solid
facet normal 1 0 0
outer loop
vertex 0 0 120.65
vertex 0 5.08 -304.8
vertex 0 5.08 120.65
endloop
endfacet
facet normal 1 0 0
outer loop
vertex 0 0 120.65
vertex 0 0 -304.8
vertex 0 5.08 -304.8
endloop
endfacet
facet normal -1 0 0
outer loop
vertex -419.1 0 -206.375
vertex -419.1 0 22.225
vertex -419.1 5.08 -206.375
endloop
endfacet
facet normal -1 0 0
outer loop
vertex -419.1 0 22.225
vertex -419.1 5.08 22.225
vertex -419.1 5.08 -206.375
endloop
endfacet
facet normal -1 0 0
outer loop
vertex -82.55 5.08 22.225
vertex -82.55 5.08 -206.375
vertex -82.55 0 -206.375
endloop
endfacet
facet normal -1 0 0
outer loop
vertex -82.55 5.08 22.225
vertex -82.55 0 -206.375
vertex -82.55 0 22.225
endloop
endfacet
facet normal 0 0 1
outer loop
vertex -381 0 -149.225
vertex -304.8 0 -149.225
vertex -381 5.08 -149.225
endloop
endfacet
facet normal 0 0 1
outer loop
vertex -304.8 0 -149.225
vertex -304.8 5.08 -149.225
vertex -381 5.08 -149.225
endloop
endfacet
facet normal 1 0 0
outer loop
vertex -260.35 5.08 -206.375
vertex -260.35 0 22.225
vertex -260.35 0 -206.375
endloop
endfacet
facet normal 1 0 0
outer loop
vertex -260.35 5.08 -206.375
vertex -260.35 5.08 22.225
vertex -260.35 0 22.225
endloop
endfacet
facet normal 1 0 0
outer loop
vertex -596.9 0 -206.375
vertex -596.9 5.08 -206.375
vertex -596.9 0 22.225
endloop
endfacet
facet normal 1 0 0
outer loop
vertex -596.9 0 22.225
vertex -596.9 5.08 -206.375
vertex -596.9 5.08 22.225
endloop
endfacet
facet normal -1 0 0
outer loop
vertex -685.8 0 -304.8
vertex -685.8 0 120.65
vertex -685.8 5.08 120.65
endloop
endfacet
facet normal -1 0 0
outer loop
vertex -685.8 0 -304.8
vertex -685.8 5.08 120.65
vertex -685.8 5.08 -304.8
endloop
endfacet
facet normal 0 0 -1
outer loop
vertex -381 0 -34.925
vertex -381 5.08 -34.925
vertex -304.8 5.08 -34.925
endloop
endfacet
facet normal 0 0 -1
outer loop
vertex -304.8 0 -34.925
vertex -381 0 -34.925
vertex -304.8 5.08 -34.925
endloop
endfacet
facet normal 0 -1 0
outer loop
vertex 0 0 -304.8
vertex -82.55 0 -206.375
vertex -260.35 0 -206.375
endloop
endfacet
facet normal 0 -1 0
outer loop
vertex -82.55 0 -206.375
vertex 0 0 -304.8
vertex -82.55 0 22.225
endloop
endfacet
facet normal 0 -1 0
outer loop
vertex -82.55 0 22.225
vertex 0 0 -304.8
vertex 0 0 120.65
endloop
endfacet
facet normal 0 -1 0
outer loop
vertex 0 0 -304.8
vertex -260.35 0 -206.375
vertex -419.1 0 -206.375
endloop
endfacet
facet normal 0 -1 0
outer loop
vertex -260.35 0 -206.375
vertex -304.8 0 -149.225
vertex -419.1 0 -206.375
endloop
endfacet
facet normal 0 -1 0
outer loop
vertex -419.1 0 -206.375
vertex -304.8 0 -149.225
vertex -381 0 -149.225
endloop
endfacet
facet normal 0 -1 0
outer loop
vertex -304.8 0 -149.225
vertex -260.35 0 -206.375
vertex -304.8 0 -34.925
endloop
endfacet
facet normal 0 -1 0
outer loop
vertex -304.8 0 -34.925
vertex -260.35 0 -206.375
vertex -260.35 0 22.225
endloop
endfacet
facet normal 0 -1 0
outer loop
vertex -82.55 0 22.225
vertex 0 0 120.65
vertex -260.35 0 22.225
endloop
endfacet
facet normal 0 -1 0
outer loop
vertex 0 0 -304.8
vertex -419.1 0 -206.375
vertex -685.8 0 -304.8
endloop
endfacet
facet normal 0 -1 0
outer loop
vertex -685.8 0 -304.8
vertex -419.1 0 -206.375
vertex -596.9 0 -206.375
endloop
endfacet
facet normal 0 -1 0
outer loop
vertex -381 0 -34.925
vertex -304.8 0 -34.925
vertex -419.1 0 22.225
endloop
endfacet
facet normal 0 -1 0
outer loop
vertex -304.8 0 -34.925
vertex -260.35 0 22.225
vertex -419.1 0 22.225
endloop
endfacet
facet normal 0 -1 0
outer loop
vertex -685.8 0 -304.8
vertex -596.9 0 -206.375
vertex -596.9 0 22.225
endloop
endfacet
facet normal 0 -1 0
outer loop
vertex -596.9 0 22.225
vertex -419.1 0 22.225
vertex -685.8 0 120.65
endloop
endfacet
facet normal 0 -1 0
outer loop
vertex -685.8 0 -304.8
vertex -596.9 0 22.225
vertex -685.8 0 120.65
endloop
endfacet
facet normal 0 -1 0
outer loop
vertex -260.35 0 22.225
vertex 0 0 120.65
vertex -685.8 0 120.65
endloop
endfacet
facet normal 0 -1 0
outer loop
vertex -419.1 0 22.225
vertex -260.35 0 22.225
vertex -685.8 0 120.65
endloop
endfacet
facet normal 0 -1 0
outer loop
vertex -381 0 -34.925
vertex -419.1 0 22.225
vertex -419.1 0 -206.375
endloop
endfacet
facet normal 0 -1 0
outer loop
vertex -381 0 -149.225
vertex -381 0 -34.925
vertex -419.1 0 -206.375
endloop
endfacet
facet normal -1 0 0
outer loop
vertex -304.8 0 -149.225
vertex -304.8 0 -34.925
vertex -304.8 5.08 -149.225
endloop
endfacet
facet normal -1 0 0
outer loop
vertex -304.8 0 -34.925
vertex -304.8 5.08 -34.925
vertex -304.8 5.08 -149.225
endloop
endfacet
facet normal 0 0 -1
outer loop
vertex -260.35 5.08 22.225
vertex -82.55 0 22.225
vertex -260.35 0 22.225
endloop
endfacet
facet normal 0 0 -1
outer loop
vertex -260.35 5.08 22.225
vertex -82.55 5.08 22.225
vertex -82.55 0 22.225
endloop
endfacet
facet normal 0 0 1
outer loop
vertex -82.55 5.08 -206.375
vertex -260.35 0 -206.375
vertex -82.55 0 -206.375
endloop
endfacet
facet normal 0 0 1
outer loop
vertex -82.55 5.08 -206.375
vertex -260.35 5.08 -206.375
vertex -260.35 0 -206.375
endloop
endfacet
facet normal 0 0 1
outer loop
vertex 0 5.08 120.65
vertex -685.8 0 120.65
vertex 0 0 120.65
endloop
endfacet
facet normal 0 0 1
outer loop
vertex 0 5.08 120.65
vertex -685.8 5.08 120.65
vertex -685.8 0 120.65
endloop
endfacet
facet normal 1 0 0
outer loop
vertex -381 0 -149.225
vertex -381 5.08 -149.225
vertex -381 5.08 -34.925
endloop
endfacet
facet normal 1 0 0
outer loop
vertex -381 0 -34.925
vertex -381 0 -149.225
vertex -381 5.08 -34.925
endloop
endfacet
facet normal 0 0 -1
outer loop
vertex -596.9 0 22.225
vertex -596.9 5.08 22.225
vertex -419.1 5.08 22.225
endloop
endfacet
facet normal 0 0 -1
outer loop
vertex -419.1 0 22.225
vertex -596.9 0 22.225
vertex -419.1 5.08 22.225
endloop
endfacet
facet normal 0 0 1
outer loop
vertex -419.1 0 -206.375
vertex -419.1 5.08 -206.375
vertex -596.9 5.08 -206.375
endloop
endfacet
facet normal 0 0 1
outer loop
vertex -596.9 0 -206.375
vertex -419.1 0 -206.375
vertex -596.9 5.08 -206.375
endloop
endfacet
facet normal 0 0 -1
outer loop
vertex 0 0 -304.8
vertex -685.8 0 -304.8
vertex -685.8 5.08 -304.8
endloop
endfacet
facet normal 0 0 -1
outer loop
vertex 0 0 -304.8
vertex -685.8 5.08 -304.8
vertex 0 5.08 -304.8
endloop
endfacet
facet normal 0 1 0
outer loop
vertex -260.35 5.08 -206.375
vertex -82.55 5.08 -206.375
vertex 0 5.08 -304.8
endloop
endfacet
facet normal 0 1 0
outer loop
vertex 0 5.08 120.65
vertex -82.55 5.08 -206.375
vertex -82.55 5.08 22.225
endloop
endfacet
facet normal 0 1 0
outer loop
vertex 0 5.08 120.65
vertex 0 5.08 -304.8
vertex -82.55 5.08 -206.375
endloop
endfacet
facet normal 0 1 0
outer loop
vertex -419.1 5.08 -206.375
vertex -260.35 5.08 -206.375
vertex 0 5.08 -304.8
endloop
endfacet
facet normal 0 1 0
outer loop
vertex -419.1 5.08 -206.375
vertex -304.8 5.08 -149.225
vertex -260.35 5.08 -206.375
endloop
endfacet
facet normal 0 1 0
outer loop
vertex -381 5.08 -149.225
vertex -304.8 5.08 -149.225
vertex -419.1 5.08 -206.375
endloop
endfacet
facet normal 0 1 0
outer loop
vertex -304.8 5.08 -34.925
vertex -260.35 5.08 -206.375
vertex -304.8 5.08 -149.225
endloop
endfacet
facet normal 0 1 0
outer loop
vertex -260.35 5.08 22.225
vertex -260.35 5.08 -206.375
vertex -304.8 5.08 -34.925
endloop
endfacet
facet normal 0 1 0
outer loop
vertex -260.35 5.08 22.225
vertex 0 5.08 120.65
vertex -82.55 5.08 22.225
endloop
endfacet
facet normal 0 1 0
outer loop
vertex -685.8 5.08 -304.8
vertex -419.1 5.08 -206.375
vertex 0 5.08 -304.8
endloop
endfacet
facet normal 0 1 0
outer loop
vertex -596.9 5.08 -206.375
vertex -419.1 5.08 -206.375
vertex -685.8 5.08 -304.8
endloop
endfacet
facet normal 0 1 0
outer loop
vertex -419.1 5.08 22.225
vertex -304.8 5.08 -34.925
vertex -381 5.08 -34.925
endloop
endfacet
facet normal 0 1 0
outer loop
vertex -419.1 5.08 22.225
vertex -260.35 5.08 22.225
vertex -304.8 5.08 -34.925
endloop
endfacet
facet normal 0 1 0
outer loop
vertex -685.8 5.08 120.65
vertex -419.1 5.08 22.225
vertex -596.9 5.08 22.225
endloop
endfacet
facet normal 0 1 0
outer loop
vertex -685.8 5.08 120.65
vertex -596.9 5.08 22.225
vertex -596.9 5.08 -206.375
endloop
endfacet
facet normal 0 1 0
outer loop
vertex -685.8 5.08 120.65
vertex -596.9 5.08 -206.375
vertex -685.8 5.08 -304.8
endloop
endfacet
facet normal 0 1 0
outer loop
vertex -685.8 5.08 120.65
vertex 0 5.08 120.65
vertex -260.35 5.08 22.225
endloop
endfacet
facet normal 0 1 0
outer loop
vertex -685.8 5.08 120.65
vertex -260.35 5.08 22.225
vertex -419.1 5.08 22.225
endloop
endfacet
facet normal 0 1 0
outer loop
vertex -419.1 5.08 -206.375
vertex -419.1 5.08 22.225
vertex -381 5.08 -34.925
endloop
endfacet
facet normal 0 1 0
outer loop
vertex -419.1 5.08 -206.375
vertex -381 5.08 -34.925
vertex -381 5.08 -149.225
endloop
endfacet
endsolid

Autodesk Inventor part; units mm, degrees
ref_plane "YZ Plane" through (0, 0, 0) normal (1, 0, 0) x (0, 1, 0)
ref_plane "XZ Plane" through (0, 0, 0) normal (0, 1, 0) x (-1, 0, 0)
ref_plane "XY Plane" through (0, 0, 0) normal (0, 0, 1) x (1, 0, 0)
sketch "Sketch1" plane through (0, 0, 0) normal (0, 1, 0) x (-1, 0, 0)
  line L0 (0, 0) -> (685.8, 0)
  line L1 (685.8, 0) -> (685.8, -304.8)
  line L2 (685.8, -304.8) -> (0, -304.8)
  line L3 (0, -304.8) -> (0, 0)
  line L4 (685.8, 0) -> (0, 0)
  line L5 (0, 0) -> (0, 120.65)
  line L6 (0, 120.65) -> (685.8, 120.65)
  line L7 (685.8, 120.65) -> (685.8, 0)
  dimension "d0" = 685.8
  dimension "d1" = 304.8
  dimension "d4" = 120.65
extrude "Extrusion1" add sketch "Sketch1" along normal blind 5.08 contours L0 L1 L2 L3
sketch "Sketch2" plane through (-685.8, 0, 0) normal (0, 0, 1) x (1, 0, 0)
  line L0 (685.8, 0) -> (0, 0) projected
  line L1 (685.8, 0) -> (685.8, 5.08) projected
  line L2 (0, 5.08) -> (685.8, 5.08) projected
  line L3 (0, 0) -> (0, 5.08) projected
extrude "Extrusion2" add sketch "Sketch2" along normal blind 120.65
sketch "Sketch3" plane through (0, 5.08, 0) normal (0, 1, 0) x (1, 0, 0)
  point P0 (0, 0)
sketch "Sketch4" plane through (0, 5.08, 0) normal (0, 1, 0) x (1, 0, 0)
  line L0 (-685.8, -120.65) -> (-685.8, 304.8) projected
  line L1 (-685.8, 92.075) -> (-609.6, 92.075)
  line L2 (-609.6, 92.075) -> (-609.6, -34.925)
  line L3 (-609.6, 92.075) -> (-609.6, 219.075)
  line L4 (-609.6, 219.075) -> (-406.4, 219.075)
  line L5 (-406.4, 219.075) -> (-406.4, -34.925)
  line L6 (-406.4, -34.925) -> (-609.6, -34.925)
  line L7 (0, 304.8) -> (0, -120.65) projected
  line L8 (0, 92.075) -> (-69.85, 92.075)
  line L9 (-69.85, 92.075) -> (-69.85, 219.075)
  line L10 (-69.85, 219.075) -> (-273.05, 219.075)
  line L11 (-273.05, 219.075) -> (-273.05, -34.925)
  line L12 (-273.05, -34.925) -> (-69.85, -34.925)
  line L13 (-69.85, -34.925) -> (-69.85, 92.075)
  line L14 (-419.1, -22.225) -> (-419.1, 206.375)
  line L15 (-419.1, 206.375) -> (-596.9, 206.375)
  line L16 (-596.9, 206.375) -> (-596.9, 92.075)
  line L17 (-596.9, 92.075) -> (-596.9, -22.225)
  line L18 (-596.9, -22.225) -> (-419.1, -22.225)
  line L19 (-260.35, -22.225) -> (-260.35, 206.375)
  line L20 (-260.35, 206.375) -> (-82.55, 206.375)
  line L21 (-82.55, 206.375) -> (-82.55, 92.075)
  line L22 (-82.55, 92.075) -> (-82.55, -22.225)
  line L23 (-82.55, -22.225) -> (-260.35, -22.225)
  point P0 (0, 0)
  dimension "d7" = 76.2
  dimension "d8" = 127
  dimension "d9" = 127
  dimension "d10" = 203.2
  dimension "d11" = 69.85
  dimension "d12" = 203.2
  dimension "d13" = 12.7
  dimension "d14" = 12.7
extrude "Extrusion3" cut sketch "Sketch4" against normal blind 25.4 contours L18 L17 L16 L15 L14 | L19 L20 L21 L22 L23
sketch "Sketch5" plane through (0, 5.08, 0) normal (0, 1, 0) x (1, 0, 0)
  point P0 (0, 0)
sketch "Sketch6" plane through (0, 5.08, 0) normal (0, 1, 0) x (1, 0, 0)
  line L0 (-596.9, 206.375) -> (-419.1, 206.375) projected
  line L1 (-419.1, 206.375) -> (-419.1, -22.225) projected
  line L2 (-419.1, -22.225) -> (-596.9, -22.225) projected
  line L3 (-596.9, -22.225) -> (-596.9, 206.375) projected
  line L4 (-82.55, -22.225) -> (-260.35, -22.225) projected
  line L5 (-260.35, -22.225) -> (-260.35, 206.375) projected
  line L6 (-260.35, 206.375) -> (-82.55, 206.375) projected
  line L7 (-82.55, 206.375) -> (-82.55, -22.225) projected
  line L8 (0, 304.8) -> (0, -120.65) projected
  line L9 (0, 304.8) -> (-685.8, 304.8) projected
  line L10 (-685.8, 304.8) -> (-685.8, -120.65) projected
  line L11 (0, -120.65) -> (-685.8, -120.65) projected
  line L12 (-596.9, 206.375) -> (-419.1, 206.375)
  line L13 (-419.1, 206.375) -> (-419.1, -22.225)
  line L14 (-419.1, -22.225) -> (-596.9, -22.225)
  line L15 (-596.9, -22.225) -> (-596.9, 206.375)
  line L16 (-419.1, 206.375) -> (-419.1, -22.225) projected
  line L17 (-260.35, 206.375) -> (-82.55, 206.375)
  line L18 (-82.55, 206.375) -> (-82.55, -22.225)
  line L19 (-82.55, -22.225) -> (-260.35, -22.225)
  line L20 (-260.35, -22.225) -> (-260.35, 206.375)
  line L21 (-508, -22.225) -> (-508, 206.375)
  line L22 (-596.9, -22.225) -> (-596.9, 206.375) projected
  line L23 (-596.9, 92.075) -> (-419.1, 92.075)
  line L24 (-171.45, 206.375) -> (-171.45, -22.225)
  line L25 (-82.55, 92.075) -> (-260.35, 92.075)
  point P0 (0, 0)
  point P1 (-508, 92.075)
  point P2 (-171.45, 92.075)
sketch "Sketch7" plane through (0, 5.08, 0) normal (0, 1, 0) x (1, 0, 0)
  line L0 (-596.9, 206.375) -> (-419.1, 206.375) projected
  line L1 (-419.1, 206.375) -> (-419.1, -22.225) projected
  line L2 (-419.1, -22.225) -> (-596.9, -22.225) projected
  line L3 (-596.9, -22.225) -> (-596.9, 206.375) projected
  line L4 (-82.55, -22.225) -> (-260.35, -22.225) projected
  line L5 (-260.35, -22.225) -> (-260.35, 206.375) projected
  line L6 (-260.35, 206.375) -> (-82.55, 206.375) projected
  line L7 (-82.55, 206.375) -> (-82.55, -22.225) projected
  line L8 (0, 304.8) -> (0, -120.65) projected
  line L9 (0, 304.8) -> (-685.8, 304.8) projected
  line L10 (-685.8, 304.8) -> (-685.8, -120.65) projected
  line L11 (0, -120.65) -> (-685.8, -120.65) projected
  line L12 (-381, 34.925) -> (-304.8, 34.925)
  line L13 (-304.8, 34.925) -> (-304.8, 149.225)
  line L14 (-304.8, 149.225) -> (-381, 149.225)
  line L15 (-381, 149.225) -> (-381, 34.925)
  line L16 (-381, 34.925) -> (-304.8, 149.225) construction
  line L17 (-304.8, 34.925) -> (-381, 149.225) construction
  point P0 (0, 0)
  point P1 (-342.9, 92.075)
  dimension "d17" = 76.2
  dimension "d18" = 114.3
extrude "Extrusion4" cut sketch "Sketch7" against normal blind 25.4 contours L15 L14 L13 L12
properties part number "cart_woodpanel-front" material "Wood (Birch)"
